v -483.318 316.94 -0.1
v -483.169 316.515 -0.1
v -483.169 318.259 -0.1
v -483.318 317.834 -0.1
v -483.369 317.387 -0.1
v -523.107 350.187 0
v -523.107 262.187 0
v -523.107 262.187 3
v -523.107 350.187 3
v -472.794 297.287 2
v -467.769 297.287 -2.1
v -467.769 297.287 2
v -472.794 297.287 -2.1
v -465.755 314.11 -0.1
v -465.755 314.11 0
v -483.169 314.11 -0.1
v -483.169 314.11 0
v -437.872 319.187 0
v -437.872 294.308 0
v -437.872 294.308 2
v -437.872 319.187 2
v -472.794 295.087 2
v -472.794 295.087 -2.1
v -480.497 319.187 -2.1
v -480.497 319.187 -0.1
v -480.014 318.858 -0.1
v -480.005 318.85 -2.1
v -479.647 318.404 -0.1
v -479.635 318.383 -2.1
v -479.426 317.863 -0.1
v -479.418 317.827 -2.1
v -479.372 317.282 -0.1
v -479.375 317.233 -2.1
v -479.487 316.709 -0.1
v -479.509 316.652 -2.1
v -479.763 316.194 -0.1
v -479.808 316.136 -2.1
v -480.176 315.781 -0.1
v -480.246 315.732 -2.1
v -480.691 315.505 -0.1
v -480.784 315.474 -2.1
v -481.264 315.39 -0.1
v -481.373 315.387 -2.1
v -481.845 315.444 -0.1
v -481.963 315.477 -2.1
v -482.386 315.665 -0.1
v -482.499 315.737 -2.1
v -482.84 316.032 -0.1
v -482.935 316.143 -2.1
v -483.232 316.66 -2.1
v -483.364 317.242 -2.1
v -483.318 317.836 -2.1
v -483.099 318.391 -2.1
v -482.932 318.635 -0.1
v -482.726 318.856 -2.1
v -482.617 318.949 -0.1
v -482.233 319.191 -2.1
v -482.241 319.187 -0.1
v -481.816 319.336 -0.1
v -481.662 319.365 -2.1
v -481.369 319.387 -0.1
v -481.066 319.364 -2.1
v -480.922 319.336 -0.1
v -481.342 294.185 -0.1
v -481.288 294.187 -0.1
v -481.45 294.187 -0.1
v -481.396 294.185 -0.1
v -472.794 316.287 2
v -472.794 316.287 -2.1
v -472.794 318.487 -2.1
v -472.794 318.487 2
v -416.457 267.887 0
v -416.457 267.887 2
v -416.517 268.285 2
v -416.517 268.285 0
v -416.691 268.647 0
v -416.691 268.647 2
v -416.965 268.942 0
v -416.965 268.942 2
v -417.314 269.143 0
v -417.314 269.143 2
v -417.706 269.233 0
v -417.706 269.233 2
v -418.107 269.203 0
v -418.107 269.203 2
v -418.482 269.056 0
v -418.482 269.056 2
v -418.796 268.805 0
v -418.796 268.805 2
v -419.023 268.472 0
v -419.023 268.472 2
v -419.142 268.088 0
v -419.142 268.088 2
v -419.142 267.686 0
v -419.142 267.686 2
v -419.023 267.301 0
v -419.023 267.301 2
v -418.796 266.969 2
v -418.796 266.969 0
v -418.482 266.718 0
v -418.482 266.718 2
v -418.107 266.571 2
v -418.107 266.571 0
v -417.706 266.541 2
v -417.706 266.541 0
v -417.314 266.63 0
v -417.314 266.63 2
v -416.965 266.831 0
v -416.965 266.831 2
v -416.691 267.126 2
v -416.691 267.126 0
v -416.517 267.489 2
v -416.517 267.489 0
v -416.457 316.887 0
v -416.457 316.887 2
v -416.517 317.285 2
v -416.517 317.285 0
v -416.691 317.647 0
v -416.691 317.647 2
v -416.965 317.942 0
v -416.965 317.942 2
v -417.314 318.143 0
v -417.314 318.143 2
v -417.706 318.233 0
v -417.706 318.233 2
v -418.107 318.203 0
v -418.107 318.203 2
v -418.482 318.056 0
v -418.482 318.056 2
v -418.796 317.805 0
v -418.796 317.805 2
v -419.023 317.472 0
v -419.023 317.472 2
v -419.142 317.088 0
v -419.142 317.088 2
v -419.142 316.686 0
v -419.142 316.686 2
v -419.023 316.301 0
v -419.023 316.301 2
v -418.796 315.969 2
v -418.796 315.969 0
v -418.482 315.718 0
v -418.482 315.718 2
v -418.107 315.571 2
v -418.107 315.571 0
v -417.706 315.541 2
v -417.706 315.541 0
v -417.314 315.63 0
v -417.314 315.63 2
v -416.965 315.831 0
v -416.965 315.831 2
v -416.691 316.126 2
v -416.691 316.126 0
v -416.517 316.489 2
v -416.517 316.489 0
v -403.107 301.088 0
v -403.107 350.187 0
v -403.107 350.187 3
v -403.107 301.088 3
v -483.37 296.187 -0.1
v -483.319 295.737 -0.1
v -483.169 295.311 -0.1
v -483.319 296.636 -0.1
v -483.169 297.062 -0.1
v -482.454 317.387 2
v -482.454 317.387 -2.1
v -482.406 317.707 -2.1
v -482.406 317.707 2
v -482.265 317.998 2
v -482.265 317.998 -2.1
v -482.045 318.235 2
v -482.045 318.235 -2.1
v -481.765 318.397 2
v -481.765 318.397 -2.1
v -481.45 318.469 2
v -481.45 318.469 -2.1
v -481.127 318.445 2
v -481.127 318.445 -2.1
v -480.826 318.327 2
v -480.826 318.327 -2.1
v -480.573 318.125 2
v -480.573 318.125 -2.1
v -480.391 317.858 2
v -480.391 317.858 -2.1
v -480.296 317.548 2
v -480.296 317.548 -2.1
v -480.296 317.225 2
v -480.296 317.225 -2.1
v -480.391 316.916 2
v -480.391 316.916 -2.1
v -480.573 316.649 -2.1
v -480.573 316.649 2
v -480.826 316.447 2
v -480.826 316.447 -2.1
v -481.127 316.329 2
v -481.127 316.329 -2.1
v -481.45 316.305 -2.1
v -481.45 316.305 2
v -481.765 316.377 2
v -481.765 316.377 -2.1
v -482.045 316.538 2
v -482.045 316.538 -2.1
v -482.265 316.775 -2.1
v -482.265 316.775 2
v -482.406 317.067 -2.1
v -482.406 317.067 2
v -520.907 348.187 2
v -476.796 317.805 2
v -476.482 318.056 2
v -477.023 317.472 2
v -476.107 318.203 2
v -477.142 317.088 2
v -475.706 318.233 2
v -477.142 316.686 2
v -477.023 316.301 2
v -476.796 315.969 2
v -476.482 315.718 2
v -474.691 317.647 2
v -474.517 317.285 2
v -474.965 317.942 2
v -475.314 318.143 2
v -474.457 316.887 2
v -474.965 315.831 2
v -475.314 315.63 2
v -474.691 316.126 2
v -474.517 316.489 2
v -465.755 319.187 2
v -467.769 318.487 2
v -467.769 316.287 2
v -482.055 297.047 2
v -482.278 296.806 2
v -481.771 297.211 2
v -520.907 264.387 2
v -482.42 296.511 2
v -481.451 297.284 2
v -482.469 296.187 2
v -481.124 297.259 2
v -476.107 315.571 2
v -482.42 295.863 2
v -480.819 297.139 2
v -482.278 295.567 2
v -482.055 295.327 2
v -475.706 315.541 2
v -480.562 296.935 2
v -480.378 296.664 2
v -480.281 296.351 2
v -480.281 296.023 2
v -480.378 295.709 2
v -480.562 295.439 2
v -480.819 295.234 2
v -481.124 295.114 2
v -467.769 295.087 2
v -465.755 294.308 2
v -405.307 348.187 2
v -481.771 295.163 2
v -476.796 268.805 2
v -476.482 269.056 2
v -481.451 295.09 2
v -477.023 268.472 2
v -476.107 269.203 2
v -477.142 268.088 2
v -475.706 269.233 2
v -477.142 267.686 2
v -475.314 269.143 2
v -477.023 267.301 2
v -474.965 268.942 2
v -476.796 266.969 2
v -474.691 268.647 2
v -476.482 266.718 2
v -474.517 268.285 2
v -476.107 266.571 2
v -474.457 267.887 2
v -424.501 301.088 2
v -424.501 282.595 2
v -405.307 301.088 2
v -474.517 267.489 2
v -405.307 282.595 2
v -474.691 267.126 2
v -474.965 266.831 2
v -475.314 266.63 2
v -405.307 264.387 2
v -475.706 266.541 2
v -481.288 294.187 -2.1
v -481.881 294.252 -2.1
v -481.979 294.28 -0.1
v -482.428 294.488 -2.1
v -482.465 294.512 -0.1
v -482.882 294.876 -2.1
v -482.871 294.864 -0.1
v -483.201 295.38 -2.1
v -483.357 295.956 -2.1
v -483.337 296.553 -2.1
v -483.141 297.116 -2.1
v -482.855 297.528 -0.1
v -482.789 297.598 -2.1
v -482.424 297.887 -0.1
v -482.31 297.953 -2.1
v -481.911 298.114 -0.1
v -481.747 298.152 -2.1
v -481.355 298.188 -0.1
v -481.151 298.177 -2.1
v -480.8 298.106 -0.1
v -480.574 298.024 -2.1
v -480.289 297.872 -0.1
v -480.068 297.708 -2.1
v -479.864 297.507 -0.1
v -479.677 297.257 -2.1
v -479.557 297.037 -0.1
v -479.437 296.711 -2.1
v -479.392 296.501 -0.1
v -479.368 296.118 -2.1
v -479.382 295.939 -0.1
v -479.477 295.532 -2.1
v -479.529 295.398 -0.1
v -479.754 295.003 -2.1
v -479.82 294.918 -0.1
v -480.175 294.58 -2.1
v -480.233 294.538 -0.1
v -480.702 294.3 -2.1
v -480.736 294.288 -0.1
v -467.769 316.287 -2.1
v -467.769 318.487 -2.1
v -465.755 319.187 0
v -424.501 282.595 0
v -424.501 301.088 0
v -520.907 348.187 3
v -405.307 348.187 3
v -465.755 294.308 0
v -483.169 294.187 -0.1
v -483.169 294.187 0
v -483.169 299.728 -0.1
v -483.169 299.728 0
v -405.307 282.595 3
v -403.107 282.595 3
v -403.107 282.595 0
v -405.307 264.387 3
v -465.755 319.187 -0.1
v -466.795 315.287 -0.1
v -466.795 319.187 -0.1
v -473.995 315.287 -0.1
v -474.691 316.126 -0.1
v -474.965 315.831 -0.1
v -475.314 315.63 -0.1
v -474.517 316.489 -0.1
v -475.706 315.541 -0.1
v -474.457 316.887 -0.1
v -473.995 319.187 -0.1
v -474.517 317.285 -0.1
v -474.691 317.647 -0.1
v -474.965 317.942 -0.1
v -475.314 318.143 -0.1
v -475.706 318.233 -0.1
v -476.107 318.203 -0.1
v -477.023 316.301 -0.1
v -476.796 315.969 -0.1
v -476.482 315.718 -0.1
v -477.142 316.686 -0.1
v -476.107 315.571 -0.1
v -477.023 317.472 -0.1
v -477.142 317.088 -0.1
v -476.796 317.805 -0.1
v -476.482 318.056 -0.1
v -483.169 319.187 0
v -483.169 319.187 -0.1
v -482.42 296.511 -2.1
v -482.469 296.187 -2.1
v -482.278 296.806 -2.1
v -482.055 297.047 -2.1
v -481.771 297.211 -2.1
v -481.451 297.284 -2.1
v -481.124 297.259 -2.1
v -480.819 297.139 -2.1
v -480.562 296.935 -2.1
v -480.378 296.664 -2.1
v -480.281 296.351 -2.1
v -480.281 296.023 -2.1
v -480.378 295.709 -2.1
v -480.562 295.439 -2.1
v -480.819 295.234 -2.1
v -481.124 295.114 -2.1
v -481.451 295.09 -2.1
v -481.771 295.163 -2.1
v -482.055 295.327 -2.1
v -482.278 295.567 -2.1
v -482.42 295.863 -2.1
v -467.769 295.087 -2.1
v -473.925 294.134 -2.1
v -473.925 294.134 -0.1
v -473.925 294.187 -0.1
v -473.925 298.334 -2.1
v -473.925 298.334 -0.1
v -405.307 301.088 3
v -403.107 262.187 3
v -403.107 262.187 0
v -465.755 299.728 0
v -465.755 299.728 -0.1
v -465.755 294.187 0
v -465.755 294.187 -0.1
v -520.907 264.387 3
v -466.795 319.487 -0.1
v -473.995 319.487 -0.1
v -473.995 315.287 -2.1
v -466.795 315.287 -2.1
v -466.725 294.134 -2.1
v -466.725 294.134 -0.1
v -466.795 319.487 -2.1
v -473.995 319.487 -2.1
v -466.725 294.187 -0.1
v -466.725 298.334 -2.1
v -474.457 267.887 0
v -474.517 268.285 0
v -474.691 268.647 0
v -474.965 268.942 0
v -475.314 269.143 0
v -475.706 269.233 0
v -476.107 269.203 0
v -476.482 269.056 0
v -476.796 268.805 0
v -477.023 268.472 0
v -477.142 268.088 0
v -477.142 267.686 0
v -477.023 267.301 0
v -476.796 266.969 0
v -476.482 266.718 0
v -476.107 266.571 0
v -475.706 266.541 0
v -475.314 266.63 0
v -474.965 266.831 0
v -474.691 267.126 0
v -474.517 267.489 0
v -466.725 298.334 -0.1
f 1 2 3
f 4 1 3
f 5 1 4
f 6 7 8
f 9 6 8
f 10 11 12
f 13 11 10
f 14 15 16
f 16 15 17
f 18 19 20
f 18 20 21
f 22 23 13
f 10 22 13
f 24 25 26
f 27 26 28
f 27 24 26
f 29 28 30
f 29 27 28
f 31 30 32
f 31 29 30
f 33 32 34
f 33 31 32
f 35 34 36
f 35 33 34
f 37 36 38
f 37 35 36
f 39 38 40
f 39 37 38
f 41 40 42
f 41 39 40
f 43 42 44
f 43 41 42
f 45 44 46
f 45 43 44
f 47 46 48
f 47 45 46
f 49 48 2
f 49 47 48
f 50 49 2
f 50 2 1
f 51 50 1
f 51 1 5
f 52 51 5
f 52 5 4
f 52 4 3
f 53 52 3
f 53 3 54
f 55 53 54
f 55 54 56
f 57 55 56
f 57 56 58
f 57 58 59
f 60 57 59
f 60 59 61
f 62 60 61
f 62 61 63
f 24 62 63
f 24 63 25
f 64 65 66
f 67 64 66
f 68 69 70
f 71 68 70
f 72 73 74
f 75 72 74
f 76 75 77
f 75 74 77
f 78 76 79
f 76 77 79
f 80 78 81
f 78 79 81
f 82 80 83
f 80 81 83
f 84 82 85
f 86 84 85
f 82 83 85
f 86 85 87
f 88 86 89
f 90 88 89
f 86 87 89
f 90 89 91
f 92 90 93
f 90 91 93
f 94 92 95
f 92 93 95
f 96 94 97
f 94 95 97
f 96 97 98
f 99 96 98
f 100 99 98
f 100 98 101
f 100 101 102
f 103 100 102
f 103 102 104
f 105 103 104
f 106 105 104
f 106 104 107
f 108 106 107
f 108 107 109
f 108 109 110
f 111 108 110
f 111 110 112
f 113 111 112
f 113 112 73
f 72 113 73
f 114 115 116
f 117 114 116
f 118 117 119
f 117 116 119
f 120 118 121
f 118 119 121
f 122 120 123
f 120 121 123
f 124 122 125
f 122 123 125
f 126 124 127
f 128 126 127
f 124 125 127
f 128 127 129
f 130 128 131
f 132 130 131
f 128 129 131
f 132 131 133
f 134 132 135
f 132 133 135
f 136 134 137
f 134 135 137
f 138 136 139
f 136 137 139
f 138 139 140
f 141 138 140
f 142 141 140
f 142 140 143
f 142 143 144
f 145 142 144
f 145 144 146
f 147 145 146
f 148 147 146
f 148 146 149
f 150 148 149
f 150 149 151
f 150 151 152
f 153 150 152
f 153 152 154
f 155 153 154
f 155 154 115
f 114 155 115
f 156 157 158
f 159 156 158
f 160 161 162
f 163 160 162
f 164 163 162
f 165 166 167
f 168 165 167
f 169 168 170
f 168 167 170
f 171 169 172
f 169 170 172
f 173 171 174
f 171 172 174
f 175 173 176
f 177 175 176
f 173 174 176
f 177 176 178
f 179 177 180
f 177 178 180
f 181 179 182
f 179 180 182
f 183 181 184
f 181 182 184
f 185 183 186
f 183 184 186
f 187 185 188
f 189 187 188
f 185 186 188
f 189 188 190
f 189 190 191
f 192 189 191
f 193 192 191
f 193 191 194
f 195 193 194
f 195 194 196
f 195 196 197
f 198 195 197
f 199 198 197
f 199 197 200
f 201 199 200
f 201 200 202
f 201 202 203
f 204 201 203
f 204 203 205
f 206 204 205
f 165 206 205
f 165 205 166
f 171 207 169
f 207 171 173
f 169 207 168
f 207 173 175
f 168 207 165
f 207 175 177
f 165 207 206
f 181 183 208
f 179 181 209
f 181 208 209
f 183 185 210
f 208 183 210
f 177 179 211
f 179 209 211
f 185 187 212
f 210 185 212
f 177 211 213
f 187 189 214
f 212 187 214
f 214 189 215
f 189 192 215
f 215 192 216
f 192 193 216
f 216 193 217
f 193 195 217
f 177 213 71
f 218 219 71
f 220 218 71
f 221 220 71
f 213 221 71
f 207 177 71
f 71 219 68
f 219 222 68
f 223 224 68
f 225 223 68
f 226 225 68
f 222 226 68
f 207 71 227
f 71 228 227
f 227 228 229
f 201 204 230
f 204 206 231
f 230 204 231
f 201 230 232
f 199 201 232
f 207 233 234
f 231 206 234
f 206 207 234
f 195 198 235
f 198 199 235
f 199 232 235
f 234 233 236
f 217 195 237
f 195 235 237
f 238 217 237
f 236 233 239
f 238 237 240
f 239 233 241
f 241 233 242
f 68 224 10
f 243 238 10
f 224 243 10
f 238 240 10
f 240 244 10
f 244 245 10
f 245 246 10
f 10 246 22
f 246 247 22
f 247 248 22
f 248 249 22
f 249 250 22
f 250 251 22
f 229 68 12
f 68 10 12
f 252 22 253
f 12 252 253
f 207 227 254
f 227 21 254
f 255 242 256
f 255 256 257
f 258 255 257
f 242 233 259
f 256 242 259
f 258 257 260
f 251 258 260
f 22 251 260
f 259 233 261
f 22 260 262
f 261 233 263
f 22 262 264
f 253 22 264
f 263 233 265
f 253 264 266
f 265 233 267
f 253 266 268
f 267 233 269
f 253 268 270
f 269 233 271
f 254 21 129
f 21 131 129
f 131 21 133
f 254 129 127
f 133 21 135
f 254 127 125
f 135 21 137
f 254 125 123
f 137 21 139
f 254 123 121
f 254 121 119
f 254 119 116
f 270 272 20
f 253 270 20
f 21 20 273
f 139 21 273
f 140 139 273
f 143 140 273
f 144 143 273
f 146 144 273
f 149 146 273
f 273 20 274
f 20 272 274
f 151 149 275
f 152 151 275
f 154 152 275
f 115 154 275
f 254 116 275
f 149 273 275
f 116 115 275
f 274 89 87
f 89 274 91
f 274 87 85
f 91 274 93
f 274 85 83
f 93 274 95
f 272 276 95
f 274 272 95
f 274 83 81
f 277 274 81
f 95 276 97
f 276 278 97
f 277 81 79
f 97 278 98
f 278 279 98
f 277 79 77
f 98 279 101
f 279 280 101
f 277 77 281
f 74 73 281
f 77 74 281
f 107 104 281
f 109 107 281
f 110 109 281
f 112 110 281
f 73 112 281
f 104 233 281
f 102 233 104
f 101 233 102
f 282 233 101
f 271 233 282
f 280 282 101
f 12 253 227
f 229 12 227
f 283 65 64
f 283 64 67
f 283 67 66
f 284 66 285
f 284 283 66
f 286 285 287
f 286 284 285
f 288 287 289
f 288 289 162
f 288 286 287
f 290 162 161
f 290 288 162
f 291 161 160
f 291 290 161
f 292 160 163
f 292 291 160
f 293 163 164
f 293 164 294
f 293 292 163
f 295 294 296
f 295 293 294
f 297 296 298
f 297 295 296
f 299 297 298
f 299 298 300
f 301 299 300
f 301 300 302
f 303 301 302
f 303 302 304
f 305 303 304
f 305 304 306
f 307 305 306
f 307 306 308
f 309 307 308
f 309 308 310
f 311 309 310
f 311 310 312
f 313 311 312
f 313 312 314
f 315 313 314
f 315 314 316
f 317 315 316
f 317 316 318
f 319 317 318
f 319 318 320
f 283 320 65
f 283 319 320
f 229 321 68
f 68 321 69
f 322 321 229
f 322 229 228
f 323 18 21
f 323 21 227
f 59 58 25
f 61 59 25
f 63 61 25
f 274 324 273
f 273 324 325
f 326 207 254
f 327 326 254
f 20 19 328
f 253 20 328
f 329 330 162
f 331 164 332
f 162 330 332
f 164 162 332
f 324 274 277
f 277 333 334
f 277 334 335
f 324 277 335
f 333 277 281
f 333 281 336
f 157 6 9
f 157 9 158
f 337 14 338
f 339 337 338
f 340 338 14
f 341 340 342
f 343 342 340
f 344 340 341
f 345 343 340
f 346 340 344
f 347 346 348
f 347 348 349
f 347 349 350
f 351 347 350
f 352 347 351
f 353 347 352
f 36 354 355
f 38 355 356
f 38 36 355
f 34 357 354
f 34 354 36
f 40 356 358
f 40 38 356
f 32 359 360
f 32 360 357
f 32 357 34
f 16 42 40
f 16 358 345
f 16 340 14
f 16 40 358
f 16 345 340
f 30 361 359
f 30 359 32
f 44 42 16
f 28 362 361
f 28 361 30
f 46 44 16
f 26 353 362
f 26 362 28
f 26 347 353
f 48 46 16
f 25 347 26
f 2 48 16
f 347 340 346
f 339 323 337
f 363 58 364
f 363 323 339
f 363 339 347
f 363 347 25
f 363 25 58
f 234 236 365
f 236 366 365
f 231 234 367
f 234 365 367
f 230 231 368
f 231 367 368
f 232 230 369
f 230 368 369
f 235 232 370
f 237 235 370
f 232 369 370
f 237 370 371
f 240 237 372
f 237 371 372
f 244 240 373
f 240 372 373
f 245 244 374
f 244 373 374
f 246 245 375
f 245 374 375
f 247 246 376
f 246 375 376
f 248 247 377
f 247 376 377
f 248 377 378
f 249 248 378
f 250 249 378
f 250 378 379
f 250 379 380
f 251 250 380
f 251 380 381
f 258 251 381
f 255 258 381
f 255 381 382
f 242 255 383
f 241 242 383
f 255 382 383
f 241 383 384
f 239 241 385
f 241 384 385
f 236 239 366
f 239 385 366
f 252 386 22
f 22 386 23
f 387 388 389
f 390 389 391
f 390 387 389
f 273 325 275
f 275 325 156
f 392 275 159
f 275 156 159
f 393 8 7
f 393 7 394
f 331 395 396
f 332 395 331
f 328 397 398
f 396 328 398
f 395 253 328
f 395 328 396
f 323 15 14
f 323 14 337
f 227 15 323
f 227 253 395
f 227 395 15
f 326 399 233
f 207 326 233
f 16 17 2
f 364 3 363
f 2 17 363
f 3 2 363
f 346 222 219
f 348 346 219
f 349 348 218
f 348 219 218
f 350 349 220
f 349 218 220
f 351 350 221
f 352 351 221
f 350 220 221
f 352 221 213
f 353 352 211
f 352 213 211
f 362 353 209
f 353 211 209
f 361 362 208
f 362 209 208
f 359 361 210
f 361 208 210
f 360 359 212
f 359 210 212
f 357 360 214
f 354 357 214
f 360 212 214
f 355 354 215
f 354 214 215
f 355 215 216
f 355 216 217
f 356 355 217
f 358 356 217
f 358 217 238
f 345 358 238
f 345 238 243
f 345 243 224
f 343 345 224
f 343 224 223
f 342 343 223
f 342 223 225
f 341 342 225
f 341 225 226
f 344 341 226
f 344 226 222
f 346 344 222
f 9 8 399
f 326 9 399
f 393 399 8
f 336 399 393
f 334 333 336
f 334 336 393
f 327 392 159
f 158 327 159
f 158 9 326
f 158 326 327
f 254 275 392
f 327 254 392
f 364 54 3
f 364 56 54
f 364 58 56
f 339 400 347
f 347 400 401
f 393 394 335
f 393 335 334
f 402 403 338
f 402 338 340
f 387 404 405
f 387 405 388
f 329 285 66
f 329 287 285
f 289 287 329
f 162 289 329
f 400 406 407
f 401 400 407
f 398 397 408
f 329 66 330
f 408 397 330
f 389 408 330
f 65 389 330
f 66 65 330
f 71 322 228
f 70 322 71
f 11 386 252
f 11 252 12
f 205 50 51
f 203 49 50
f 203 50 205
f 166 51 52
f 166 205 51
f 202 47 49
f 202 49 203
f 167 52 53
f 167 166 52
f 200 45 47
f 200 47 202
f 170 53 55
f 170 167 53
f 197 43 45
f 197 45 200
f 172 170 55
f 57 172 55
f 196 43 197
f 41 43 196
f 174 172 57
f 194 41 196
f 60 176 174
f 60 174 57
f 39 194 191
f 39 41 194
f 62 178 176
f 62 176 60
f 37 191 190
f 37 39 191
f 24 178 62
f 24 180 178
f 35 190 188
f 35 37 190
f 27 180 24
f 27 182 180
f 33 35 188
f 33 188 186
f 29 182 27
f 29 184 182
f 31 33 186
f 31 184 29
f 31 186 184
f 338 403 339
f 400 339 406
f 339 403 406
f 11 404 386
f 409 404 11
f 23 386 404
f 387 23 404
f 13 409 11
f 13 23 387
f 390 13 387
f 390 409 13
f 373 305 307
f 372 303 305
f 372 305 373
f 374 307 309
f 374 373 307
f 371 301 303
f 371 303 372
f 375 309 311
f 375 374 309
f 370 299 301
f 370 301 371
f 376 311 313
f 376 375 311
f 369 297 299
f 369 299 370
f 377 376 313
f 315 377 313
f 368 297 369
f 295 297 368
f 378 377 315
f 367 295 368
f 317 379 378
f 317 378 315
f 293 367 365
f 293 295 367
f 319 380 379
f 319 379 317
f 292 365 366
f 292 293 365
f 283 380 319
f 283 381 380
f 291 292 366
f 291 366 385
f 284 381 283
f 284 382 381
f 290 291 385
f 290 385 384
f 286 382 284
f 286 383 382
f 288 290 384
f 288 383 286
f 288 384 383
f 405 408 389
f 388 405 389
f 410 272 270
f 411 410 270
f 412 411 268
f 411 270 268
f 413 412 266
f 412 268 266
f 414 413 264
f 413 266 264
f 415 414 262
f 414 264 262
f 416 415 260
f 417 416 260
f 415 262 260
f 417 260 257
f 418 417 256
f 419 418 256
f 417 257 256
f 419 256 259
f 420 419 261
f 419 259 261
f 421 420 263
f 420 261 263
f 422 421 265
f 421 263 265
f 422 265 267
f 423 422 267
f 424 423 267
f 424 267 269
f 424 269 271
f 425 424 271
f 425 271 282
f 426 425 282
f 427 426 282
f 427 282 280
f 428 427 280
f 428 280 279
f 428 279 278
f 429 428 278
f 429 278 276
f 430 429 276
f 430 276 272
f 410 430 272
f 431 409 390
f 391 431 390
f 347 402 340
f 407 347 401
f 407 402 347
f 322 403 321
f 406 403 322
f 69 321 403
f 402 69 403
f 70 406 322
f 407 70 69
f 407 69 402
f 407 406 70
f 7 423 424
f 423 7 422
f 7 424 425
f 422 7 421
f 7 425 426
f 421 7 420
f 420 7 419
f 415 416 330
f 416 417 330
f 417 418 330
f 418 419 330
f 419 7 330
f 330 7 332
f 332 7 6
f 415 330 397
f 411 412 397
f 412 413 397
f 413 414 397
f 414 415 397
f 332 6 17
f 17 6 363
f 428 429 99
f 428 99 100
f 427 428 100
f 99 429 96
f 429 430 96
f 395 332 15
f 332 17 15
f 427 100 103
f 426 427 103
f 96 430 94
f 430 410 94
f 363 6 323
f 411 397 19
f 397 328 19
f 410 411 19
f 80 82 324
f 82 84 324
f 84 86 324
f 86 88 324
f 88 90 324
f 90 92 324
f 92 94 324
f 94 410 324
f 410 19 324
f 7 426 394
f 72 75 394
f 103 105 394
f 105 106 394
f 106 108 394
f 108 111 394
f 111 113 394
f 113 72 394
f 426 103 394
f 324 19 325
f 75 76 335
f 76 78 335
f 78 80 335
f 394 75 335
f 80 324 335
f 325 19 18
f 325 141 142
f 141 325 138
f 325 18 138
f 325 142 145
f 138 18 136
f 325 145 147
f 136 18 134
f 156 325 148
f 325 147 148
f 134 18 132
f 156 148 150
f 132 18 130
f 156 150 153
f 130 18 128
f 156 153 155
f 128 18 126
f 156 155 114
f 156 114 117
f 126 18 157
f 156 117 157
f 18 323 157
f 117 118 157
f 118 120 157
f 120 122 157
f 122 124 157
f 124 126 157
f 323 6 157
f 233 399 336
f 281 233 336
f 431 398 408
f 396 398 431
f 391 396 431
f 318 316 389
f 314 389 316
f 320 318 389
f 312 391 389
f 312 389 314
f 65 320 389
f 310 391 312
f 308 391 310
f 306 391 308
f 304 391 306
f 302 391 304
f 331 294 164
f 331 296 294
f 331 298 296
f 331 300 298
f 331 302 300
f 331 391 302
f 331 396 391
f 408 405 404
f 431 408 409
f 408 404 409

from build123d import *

# Parameters (mm, degrees)
SKETCH_1_W          = 120
SKETCH_1_H          = 80
EXTRUDE_1_DEPTH     = 38
SKETCH_3_W          = 117.6
SKETCH_3_H          = 77.6
CUT_EXTRUDE_1_DEPTH = 36
SKETCH_4_W          = 25.152970524
SKETCH_4_H          = 18.492901276
CUT_EXTRUDE_2_DEPTH = 10
SKETCH_7_W          = 17.413678367
SKETCH_7_H          = 5.076618726
SKETCH_7_H_2        = 5.541721388
EXTRUDE_2_DEPTH     = 0.1
SKETCH_9_W          = 27.882777132
SKETCH_9_H          = 24.878568111
CUT_EXTRUDE_4_DEPTH = 12
SKETCH_12_R         = 1.085209003
SKETCH_12_R_2       = 1.1
SKETCH_12_W         = 5.025
SKETCH_12_H         = 2.2
CUT_EXTRUDE_5_DEPTH = 12
SKETCH_13_R         = 1.35
CUT_EXTRUDE_6_DEPTH = 12
SKETCH_14_W         = 117.6
SKETCH_14_H         = 36
CUT_EXTRUDE_7_DEPTH = 10
EXTRUDE_3_DEPTH     = 5
SKETCH_16_W         = 120
SKETCH_16_H         = 38
EXTRUDE_4_DEPTH     = 2
SKETCH_17_W         = 36
SKETCH_17_H         = 83.8
EXTRUDE_5_DEPTH     = 1
EXTRUDE_6_DEPTH     = 1
SKETCH_19_W         = 120
SKETCH_19_H         = 38
EXTRUDE_7_DEPTH     = 1
EXTRUDE_START       = 2
SKETCH_20_R         = 2
SKETCH_20_R_2       = 1.085209003
SKETCH_20_R_3       = 2.001649737
SKETCH_20_R_4       = 1.1
SKETCH_20_W         = 7.2
SKETCH_20_H         = 4.2
SKETCH_20_W_2       = 5.025
SKETCH_20_H_2       = 2.2
EXTRUDE_8_DEPTH     = 2
SKETCH_22_W         = 120
SKETCH_22_H         = 88
CUT_EXTRUDE_8_DEPTH = 35


with BuildPart() as part:
    # 草图1 → 凸台-拉伸1 (new body)
    with BuildSketch(Plane.XY):
        with Locations((-463.106796117, 303.186737633)):
            Rectangle(SKETCH_1_W, SKETCH_1_H)
    extrude(amount=EXTRUDE_1_DEPTH)

    # 草图3 → 切除-拉伸1 (cut)
    with BuildSketch(Plane.XY.offset(38)):
        with Locations((-463.106796117, 303.186737633)):
            Rectangle(SKETCH_3_W, SKETCH_3_H)
    extrude(amount=-CUT_EXTRUDE_1_DEPTH, mode=Mode.SUBTRACT)

    # 草图4 → 切除-拉伸2 (cut)
    with BuildSketch(Plane(origin=(0, 0, 0), x_dir=(-1, 0, 0), z_dir=(0, 0, -1))):
        with Locations((411.924701676, 291.841861287)):
            Rectangle(SKETCH_4_W, SKETCH_4_H)
    extrude(amount=-CUT_EXTRUDE_2_DEPTH, mode=Mode.SUBTRACT)

    # 草图7 → 凸台-拉伸2 (add)
    with BuildSketch(Plane(origin=(0, 0, 0), x_dir=(-1, 0, 0), z_dir=(0, 0, -1))):
        with Locations((474.461956934, 316.64842827)):
            Rectangle(SKETCH_7_W, SKETCH_7_H)
        with Locations((474.461956934, 296.957598327)):
            Rectangle(SKETCH_7_W, SKETCH_7_H_2)
    extrude(amount=EXTRUDE_2_DEPTH)

    # 草图9 → 切除-拉伸4 (cut)
    with BuildSketch(Plane(origin=(0, 0, 0), x_dir=(-1, 0, 0), z_dir=(0, 0, -1))):
        with Locations((451.813729184, 306.747453577)):
            Rectangle(SKETCH_9_W, SKETCH_9_H)
    extrude(amount=-CUT_EXTRUDE_4_DEPTH, mode=Mode.SUBTRACT)

    # 草图12 → 切除-拉伸5 (cut)
    with BuildSketch(Plane(origin=(0, 0, -0.1), x_dir=(-1, 0, 0), z_dir=(0, 0, -1))):
        with Locations((481.368796117, 317.386737633)):
            Circle(SKETCH_12_R)
        with Locations((481.368796117, 296.186737633)):
            Circle(SKETCH_12_R_2)
        with Locations((470.281296117, 317.386737633)):
            Rectangle(SKETCH_12_W, SKETCH_12_H)
        with Locations((470.281296117, 296.186737633)):
            Rectangle(SKETCH_12_W, SKETCH_12_H)
    extrude(amount=-CUT_EXTRUDE_5_DEPTH, mode=Mode.SUBTRACT)

    # 草图13 → 切除-拉伸6 (cut)
    with BuildSketch(Plane.XY.offset(2)):
        with Locations((-475.806796117, 316.886737633)):
            Circle(SKETCH_13_R)
        with Locations((-417.806796117, 316.886737633)):
            Circle(SKETCH_13_R)
        with Locations((-417.806796117, 267.886737633)):
            Circle(SKETCH_13_R)
        with Locations((-475.806796117, 267.886737633)):
            Circle(SKETCH_13_R)
    extrude(amount=-CUT_EXTRUDE_6_DEPTH, mode=Mode.SUBTRACT)

    # 草图14 → 切除-拉伸7 (cut)
    with BuildSketch(Plane.XZ.offset(-341.986737633)):
        with Locations((-463.106796117, 20)):
            Rectangle(SKETCH_14_W, SKETCH_14_H)
    extrude(amount=-CUT_EXTRUDE_7_DEPTH, mode=Mode.SUBTRACT)

    # 草图15 → 凸台-拉伸3 (add)
    with BuildSketch(Plane(origin=(0, 343.186737633, 0), x_dir=(1, 0, 0), z_dir=(0, 1, 0))):
        Polygon((-521.906796117, -2), (-404.306796117, -2), (-404.306796117, -38), (-403.106796117, -38), (-403.106796117, 0), (-523.106796117, 0), (-523.106796117, -38), (-521.906796117, -38), align=None)
    extrude(amount=EXTRUDE_3_DEPTH)

    # 草图16 → 凸台-拉伸4 (add)
    with BuildSketch(Plane(origin=(0, 348.186737633, 0), x_dir=(1, 0, 0), z_dir=(0, 1, 0))):
        with Locations((-463.106796117, -19)):
            Rectangle(SKETCH_16_W, SKETCH_16_H)
    extrude(amount=EXTRUDE_4_DEPTH)

    # 草图17 → 凸台-拉伸5 (add)
    with BuildSketch(Plane(origin=(-521.906796117, 0, 0), x_dir=(0, 0, -1), z_dir=(1, 0, 0))):
        with Locations((-20, 306.286737633)):
            Rectangle(SKETCH_17_W, SKETCH_17_H)
    extrude(amount=EXTRUDE_5_DEPTH)

    # 草图18 → 凸台-拉伸6 (add)
    with BuildSketch(Plane.ZY.offset(404.306796117)):
        Polygon((10, 301.088311925), (10, 282.595410649), (2, 282.595410649), (2, 264.386737633), (38, 264.386737633), (38, 348.186737633), (2, 348.186737633), (2, 301.088311925), align=None)
    extrude(amount=EXTRUDE_6_DEPTH)

    # 草图19 → 凸台-拉伸7 (add)
    with BuildSketch(Plane.XZ.offset(-263.186737633)):
        with Locations((-463.106796117, 19)):
            Rectangle(SKETCH_19_W, SKETCH_19_H)
    extrude(amount=EXTRUDE_7_DEPTH)

    # 草图20 → 凸台-拉伸8 (add)
    # profile 1 of 4: a face of its own
    with BuildSketch(Plane(origin=(0, 0, -0.1), x_dir=(-1, 0, 0), z_dir=(0, 0, -1)).offset(EXTRUDE_START)):
        with Locations(Location((481.368796117, 317.386737633, 0), (0, 0, 115.841932763))):
            Circle(SKETCH_20_R)
        with Locations((481.368796117, 317.386737633)):
            Circle(SKETCH_20_R_2, mode=Mode.SUBTRACT)
    # profile 2 of 4: a face of its own
    with BuildSketch(Plane(origin=(0, 0, -0.1), x_dir=(-1, 0, 0), z_dir=(0, 0, -1)).offset(EXTRUDE_START)):
        with Locations(Location((481.368796117, 296.186737633, 0), (0, 0, 267.673619076))):
            Circle(SKETCH_20_R_3)
        with Locations((481.368796117, 296.186737633)):
            Circle(SKETCH_20_R_4, mode=Mode.SUBTRACT)
    # profile 3 of 4: a face of its own
    with BuildSketch(Plane(origin=(0, 0, -0.1), x_dir=(-1, 0, 0), z_dir=(0, 0, -1)).offset(EXTRUDE_START)):
        with Locations((470.395177276, 317.386737633)):
            Rectangle(SKETCH_20_W, SKETCH_20_H)
        with Locations((470.281296117, 317.386737633)):
            Rectangle(SKETCH_20_W_2, SKETCH_20_H_2, mode=Mode.SUBTRACT)
    # profile 4 of 4: a face of its own
    with BuildSketch(Plane(origin=(0, 0, -0.1), x_dir=(-1, 0, 0), z_dir=(0, 0, -1)).offset(EXTRUDE_START)):
        with Locations((470.325427447, 296.233937818)):
            Rectangle(SKETCH_20_W, SKETCH_20_H)
        with Locations((470.281296117, 296.186737633)):
            Rectangle(SKETCH_20_W_2, SKETCH_20_H_2, mode=Mode.SUBTRACT)
    extrude(amount=-EXTRUDE_8_DEPTH)

    # 草图22 → 切除-拉伸8 (cut)
    with BuildSketch(Plane.XY.offset(38)):
        with Locations((-463.106796117, 306.186737633)):
            Rectangle(SKETCH_22_W, SKETCH_22_H)
    extrude(amount=-CUT_EXTRUDE_8_DEPTH, mode=Mode.SUBTRACT)


solid = part.part
